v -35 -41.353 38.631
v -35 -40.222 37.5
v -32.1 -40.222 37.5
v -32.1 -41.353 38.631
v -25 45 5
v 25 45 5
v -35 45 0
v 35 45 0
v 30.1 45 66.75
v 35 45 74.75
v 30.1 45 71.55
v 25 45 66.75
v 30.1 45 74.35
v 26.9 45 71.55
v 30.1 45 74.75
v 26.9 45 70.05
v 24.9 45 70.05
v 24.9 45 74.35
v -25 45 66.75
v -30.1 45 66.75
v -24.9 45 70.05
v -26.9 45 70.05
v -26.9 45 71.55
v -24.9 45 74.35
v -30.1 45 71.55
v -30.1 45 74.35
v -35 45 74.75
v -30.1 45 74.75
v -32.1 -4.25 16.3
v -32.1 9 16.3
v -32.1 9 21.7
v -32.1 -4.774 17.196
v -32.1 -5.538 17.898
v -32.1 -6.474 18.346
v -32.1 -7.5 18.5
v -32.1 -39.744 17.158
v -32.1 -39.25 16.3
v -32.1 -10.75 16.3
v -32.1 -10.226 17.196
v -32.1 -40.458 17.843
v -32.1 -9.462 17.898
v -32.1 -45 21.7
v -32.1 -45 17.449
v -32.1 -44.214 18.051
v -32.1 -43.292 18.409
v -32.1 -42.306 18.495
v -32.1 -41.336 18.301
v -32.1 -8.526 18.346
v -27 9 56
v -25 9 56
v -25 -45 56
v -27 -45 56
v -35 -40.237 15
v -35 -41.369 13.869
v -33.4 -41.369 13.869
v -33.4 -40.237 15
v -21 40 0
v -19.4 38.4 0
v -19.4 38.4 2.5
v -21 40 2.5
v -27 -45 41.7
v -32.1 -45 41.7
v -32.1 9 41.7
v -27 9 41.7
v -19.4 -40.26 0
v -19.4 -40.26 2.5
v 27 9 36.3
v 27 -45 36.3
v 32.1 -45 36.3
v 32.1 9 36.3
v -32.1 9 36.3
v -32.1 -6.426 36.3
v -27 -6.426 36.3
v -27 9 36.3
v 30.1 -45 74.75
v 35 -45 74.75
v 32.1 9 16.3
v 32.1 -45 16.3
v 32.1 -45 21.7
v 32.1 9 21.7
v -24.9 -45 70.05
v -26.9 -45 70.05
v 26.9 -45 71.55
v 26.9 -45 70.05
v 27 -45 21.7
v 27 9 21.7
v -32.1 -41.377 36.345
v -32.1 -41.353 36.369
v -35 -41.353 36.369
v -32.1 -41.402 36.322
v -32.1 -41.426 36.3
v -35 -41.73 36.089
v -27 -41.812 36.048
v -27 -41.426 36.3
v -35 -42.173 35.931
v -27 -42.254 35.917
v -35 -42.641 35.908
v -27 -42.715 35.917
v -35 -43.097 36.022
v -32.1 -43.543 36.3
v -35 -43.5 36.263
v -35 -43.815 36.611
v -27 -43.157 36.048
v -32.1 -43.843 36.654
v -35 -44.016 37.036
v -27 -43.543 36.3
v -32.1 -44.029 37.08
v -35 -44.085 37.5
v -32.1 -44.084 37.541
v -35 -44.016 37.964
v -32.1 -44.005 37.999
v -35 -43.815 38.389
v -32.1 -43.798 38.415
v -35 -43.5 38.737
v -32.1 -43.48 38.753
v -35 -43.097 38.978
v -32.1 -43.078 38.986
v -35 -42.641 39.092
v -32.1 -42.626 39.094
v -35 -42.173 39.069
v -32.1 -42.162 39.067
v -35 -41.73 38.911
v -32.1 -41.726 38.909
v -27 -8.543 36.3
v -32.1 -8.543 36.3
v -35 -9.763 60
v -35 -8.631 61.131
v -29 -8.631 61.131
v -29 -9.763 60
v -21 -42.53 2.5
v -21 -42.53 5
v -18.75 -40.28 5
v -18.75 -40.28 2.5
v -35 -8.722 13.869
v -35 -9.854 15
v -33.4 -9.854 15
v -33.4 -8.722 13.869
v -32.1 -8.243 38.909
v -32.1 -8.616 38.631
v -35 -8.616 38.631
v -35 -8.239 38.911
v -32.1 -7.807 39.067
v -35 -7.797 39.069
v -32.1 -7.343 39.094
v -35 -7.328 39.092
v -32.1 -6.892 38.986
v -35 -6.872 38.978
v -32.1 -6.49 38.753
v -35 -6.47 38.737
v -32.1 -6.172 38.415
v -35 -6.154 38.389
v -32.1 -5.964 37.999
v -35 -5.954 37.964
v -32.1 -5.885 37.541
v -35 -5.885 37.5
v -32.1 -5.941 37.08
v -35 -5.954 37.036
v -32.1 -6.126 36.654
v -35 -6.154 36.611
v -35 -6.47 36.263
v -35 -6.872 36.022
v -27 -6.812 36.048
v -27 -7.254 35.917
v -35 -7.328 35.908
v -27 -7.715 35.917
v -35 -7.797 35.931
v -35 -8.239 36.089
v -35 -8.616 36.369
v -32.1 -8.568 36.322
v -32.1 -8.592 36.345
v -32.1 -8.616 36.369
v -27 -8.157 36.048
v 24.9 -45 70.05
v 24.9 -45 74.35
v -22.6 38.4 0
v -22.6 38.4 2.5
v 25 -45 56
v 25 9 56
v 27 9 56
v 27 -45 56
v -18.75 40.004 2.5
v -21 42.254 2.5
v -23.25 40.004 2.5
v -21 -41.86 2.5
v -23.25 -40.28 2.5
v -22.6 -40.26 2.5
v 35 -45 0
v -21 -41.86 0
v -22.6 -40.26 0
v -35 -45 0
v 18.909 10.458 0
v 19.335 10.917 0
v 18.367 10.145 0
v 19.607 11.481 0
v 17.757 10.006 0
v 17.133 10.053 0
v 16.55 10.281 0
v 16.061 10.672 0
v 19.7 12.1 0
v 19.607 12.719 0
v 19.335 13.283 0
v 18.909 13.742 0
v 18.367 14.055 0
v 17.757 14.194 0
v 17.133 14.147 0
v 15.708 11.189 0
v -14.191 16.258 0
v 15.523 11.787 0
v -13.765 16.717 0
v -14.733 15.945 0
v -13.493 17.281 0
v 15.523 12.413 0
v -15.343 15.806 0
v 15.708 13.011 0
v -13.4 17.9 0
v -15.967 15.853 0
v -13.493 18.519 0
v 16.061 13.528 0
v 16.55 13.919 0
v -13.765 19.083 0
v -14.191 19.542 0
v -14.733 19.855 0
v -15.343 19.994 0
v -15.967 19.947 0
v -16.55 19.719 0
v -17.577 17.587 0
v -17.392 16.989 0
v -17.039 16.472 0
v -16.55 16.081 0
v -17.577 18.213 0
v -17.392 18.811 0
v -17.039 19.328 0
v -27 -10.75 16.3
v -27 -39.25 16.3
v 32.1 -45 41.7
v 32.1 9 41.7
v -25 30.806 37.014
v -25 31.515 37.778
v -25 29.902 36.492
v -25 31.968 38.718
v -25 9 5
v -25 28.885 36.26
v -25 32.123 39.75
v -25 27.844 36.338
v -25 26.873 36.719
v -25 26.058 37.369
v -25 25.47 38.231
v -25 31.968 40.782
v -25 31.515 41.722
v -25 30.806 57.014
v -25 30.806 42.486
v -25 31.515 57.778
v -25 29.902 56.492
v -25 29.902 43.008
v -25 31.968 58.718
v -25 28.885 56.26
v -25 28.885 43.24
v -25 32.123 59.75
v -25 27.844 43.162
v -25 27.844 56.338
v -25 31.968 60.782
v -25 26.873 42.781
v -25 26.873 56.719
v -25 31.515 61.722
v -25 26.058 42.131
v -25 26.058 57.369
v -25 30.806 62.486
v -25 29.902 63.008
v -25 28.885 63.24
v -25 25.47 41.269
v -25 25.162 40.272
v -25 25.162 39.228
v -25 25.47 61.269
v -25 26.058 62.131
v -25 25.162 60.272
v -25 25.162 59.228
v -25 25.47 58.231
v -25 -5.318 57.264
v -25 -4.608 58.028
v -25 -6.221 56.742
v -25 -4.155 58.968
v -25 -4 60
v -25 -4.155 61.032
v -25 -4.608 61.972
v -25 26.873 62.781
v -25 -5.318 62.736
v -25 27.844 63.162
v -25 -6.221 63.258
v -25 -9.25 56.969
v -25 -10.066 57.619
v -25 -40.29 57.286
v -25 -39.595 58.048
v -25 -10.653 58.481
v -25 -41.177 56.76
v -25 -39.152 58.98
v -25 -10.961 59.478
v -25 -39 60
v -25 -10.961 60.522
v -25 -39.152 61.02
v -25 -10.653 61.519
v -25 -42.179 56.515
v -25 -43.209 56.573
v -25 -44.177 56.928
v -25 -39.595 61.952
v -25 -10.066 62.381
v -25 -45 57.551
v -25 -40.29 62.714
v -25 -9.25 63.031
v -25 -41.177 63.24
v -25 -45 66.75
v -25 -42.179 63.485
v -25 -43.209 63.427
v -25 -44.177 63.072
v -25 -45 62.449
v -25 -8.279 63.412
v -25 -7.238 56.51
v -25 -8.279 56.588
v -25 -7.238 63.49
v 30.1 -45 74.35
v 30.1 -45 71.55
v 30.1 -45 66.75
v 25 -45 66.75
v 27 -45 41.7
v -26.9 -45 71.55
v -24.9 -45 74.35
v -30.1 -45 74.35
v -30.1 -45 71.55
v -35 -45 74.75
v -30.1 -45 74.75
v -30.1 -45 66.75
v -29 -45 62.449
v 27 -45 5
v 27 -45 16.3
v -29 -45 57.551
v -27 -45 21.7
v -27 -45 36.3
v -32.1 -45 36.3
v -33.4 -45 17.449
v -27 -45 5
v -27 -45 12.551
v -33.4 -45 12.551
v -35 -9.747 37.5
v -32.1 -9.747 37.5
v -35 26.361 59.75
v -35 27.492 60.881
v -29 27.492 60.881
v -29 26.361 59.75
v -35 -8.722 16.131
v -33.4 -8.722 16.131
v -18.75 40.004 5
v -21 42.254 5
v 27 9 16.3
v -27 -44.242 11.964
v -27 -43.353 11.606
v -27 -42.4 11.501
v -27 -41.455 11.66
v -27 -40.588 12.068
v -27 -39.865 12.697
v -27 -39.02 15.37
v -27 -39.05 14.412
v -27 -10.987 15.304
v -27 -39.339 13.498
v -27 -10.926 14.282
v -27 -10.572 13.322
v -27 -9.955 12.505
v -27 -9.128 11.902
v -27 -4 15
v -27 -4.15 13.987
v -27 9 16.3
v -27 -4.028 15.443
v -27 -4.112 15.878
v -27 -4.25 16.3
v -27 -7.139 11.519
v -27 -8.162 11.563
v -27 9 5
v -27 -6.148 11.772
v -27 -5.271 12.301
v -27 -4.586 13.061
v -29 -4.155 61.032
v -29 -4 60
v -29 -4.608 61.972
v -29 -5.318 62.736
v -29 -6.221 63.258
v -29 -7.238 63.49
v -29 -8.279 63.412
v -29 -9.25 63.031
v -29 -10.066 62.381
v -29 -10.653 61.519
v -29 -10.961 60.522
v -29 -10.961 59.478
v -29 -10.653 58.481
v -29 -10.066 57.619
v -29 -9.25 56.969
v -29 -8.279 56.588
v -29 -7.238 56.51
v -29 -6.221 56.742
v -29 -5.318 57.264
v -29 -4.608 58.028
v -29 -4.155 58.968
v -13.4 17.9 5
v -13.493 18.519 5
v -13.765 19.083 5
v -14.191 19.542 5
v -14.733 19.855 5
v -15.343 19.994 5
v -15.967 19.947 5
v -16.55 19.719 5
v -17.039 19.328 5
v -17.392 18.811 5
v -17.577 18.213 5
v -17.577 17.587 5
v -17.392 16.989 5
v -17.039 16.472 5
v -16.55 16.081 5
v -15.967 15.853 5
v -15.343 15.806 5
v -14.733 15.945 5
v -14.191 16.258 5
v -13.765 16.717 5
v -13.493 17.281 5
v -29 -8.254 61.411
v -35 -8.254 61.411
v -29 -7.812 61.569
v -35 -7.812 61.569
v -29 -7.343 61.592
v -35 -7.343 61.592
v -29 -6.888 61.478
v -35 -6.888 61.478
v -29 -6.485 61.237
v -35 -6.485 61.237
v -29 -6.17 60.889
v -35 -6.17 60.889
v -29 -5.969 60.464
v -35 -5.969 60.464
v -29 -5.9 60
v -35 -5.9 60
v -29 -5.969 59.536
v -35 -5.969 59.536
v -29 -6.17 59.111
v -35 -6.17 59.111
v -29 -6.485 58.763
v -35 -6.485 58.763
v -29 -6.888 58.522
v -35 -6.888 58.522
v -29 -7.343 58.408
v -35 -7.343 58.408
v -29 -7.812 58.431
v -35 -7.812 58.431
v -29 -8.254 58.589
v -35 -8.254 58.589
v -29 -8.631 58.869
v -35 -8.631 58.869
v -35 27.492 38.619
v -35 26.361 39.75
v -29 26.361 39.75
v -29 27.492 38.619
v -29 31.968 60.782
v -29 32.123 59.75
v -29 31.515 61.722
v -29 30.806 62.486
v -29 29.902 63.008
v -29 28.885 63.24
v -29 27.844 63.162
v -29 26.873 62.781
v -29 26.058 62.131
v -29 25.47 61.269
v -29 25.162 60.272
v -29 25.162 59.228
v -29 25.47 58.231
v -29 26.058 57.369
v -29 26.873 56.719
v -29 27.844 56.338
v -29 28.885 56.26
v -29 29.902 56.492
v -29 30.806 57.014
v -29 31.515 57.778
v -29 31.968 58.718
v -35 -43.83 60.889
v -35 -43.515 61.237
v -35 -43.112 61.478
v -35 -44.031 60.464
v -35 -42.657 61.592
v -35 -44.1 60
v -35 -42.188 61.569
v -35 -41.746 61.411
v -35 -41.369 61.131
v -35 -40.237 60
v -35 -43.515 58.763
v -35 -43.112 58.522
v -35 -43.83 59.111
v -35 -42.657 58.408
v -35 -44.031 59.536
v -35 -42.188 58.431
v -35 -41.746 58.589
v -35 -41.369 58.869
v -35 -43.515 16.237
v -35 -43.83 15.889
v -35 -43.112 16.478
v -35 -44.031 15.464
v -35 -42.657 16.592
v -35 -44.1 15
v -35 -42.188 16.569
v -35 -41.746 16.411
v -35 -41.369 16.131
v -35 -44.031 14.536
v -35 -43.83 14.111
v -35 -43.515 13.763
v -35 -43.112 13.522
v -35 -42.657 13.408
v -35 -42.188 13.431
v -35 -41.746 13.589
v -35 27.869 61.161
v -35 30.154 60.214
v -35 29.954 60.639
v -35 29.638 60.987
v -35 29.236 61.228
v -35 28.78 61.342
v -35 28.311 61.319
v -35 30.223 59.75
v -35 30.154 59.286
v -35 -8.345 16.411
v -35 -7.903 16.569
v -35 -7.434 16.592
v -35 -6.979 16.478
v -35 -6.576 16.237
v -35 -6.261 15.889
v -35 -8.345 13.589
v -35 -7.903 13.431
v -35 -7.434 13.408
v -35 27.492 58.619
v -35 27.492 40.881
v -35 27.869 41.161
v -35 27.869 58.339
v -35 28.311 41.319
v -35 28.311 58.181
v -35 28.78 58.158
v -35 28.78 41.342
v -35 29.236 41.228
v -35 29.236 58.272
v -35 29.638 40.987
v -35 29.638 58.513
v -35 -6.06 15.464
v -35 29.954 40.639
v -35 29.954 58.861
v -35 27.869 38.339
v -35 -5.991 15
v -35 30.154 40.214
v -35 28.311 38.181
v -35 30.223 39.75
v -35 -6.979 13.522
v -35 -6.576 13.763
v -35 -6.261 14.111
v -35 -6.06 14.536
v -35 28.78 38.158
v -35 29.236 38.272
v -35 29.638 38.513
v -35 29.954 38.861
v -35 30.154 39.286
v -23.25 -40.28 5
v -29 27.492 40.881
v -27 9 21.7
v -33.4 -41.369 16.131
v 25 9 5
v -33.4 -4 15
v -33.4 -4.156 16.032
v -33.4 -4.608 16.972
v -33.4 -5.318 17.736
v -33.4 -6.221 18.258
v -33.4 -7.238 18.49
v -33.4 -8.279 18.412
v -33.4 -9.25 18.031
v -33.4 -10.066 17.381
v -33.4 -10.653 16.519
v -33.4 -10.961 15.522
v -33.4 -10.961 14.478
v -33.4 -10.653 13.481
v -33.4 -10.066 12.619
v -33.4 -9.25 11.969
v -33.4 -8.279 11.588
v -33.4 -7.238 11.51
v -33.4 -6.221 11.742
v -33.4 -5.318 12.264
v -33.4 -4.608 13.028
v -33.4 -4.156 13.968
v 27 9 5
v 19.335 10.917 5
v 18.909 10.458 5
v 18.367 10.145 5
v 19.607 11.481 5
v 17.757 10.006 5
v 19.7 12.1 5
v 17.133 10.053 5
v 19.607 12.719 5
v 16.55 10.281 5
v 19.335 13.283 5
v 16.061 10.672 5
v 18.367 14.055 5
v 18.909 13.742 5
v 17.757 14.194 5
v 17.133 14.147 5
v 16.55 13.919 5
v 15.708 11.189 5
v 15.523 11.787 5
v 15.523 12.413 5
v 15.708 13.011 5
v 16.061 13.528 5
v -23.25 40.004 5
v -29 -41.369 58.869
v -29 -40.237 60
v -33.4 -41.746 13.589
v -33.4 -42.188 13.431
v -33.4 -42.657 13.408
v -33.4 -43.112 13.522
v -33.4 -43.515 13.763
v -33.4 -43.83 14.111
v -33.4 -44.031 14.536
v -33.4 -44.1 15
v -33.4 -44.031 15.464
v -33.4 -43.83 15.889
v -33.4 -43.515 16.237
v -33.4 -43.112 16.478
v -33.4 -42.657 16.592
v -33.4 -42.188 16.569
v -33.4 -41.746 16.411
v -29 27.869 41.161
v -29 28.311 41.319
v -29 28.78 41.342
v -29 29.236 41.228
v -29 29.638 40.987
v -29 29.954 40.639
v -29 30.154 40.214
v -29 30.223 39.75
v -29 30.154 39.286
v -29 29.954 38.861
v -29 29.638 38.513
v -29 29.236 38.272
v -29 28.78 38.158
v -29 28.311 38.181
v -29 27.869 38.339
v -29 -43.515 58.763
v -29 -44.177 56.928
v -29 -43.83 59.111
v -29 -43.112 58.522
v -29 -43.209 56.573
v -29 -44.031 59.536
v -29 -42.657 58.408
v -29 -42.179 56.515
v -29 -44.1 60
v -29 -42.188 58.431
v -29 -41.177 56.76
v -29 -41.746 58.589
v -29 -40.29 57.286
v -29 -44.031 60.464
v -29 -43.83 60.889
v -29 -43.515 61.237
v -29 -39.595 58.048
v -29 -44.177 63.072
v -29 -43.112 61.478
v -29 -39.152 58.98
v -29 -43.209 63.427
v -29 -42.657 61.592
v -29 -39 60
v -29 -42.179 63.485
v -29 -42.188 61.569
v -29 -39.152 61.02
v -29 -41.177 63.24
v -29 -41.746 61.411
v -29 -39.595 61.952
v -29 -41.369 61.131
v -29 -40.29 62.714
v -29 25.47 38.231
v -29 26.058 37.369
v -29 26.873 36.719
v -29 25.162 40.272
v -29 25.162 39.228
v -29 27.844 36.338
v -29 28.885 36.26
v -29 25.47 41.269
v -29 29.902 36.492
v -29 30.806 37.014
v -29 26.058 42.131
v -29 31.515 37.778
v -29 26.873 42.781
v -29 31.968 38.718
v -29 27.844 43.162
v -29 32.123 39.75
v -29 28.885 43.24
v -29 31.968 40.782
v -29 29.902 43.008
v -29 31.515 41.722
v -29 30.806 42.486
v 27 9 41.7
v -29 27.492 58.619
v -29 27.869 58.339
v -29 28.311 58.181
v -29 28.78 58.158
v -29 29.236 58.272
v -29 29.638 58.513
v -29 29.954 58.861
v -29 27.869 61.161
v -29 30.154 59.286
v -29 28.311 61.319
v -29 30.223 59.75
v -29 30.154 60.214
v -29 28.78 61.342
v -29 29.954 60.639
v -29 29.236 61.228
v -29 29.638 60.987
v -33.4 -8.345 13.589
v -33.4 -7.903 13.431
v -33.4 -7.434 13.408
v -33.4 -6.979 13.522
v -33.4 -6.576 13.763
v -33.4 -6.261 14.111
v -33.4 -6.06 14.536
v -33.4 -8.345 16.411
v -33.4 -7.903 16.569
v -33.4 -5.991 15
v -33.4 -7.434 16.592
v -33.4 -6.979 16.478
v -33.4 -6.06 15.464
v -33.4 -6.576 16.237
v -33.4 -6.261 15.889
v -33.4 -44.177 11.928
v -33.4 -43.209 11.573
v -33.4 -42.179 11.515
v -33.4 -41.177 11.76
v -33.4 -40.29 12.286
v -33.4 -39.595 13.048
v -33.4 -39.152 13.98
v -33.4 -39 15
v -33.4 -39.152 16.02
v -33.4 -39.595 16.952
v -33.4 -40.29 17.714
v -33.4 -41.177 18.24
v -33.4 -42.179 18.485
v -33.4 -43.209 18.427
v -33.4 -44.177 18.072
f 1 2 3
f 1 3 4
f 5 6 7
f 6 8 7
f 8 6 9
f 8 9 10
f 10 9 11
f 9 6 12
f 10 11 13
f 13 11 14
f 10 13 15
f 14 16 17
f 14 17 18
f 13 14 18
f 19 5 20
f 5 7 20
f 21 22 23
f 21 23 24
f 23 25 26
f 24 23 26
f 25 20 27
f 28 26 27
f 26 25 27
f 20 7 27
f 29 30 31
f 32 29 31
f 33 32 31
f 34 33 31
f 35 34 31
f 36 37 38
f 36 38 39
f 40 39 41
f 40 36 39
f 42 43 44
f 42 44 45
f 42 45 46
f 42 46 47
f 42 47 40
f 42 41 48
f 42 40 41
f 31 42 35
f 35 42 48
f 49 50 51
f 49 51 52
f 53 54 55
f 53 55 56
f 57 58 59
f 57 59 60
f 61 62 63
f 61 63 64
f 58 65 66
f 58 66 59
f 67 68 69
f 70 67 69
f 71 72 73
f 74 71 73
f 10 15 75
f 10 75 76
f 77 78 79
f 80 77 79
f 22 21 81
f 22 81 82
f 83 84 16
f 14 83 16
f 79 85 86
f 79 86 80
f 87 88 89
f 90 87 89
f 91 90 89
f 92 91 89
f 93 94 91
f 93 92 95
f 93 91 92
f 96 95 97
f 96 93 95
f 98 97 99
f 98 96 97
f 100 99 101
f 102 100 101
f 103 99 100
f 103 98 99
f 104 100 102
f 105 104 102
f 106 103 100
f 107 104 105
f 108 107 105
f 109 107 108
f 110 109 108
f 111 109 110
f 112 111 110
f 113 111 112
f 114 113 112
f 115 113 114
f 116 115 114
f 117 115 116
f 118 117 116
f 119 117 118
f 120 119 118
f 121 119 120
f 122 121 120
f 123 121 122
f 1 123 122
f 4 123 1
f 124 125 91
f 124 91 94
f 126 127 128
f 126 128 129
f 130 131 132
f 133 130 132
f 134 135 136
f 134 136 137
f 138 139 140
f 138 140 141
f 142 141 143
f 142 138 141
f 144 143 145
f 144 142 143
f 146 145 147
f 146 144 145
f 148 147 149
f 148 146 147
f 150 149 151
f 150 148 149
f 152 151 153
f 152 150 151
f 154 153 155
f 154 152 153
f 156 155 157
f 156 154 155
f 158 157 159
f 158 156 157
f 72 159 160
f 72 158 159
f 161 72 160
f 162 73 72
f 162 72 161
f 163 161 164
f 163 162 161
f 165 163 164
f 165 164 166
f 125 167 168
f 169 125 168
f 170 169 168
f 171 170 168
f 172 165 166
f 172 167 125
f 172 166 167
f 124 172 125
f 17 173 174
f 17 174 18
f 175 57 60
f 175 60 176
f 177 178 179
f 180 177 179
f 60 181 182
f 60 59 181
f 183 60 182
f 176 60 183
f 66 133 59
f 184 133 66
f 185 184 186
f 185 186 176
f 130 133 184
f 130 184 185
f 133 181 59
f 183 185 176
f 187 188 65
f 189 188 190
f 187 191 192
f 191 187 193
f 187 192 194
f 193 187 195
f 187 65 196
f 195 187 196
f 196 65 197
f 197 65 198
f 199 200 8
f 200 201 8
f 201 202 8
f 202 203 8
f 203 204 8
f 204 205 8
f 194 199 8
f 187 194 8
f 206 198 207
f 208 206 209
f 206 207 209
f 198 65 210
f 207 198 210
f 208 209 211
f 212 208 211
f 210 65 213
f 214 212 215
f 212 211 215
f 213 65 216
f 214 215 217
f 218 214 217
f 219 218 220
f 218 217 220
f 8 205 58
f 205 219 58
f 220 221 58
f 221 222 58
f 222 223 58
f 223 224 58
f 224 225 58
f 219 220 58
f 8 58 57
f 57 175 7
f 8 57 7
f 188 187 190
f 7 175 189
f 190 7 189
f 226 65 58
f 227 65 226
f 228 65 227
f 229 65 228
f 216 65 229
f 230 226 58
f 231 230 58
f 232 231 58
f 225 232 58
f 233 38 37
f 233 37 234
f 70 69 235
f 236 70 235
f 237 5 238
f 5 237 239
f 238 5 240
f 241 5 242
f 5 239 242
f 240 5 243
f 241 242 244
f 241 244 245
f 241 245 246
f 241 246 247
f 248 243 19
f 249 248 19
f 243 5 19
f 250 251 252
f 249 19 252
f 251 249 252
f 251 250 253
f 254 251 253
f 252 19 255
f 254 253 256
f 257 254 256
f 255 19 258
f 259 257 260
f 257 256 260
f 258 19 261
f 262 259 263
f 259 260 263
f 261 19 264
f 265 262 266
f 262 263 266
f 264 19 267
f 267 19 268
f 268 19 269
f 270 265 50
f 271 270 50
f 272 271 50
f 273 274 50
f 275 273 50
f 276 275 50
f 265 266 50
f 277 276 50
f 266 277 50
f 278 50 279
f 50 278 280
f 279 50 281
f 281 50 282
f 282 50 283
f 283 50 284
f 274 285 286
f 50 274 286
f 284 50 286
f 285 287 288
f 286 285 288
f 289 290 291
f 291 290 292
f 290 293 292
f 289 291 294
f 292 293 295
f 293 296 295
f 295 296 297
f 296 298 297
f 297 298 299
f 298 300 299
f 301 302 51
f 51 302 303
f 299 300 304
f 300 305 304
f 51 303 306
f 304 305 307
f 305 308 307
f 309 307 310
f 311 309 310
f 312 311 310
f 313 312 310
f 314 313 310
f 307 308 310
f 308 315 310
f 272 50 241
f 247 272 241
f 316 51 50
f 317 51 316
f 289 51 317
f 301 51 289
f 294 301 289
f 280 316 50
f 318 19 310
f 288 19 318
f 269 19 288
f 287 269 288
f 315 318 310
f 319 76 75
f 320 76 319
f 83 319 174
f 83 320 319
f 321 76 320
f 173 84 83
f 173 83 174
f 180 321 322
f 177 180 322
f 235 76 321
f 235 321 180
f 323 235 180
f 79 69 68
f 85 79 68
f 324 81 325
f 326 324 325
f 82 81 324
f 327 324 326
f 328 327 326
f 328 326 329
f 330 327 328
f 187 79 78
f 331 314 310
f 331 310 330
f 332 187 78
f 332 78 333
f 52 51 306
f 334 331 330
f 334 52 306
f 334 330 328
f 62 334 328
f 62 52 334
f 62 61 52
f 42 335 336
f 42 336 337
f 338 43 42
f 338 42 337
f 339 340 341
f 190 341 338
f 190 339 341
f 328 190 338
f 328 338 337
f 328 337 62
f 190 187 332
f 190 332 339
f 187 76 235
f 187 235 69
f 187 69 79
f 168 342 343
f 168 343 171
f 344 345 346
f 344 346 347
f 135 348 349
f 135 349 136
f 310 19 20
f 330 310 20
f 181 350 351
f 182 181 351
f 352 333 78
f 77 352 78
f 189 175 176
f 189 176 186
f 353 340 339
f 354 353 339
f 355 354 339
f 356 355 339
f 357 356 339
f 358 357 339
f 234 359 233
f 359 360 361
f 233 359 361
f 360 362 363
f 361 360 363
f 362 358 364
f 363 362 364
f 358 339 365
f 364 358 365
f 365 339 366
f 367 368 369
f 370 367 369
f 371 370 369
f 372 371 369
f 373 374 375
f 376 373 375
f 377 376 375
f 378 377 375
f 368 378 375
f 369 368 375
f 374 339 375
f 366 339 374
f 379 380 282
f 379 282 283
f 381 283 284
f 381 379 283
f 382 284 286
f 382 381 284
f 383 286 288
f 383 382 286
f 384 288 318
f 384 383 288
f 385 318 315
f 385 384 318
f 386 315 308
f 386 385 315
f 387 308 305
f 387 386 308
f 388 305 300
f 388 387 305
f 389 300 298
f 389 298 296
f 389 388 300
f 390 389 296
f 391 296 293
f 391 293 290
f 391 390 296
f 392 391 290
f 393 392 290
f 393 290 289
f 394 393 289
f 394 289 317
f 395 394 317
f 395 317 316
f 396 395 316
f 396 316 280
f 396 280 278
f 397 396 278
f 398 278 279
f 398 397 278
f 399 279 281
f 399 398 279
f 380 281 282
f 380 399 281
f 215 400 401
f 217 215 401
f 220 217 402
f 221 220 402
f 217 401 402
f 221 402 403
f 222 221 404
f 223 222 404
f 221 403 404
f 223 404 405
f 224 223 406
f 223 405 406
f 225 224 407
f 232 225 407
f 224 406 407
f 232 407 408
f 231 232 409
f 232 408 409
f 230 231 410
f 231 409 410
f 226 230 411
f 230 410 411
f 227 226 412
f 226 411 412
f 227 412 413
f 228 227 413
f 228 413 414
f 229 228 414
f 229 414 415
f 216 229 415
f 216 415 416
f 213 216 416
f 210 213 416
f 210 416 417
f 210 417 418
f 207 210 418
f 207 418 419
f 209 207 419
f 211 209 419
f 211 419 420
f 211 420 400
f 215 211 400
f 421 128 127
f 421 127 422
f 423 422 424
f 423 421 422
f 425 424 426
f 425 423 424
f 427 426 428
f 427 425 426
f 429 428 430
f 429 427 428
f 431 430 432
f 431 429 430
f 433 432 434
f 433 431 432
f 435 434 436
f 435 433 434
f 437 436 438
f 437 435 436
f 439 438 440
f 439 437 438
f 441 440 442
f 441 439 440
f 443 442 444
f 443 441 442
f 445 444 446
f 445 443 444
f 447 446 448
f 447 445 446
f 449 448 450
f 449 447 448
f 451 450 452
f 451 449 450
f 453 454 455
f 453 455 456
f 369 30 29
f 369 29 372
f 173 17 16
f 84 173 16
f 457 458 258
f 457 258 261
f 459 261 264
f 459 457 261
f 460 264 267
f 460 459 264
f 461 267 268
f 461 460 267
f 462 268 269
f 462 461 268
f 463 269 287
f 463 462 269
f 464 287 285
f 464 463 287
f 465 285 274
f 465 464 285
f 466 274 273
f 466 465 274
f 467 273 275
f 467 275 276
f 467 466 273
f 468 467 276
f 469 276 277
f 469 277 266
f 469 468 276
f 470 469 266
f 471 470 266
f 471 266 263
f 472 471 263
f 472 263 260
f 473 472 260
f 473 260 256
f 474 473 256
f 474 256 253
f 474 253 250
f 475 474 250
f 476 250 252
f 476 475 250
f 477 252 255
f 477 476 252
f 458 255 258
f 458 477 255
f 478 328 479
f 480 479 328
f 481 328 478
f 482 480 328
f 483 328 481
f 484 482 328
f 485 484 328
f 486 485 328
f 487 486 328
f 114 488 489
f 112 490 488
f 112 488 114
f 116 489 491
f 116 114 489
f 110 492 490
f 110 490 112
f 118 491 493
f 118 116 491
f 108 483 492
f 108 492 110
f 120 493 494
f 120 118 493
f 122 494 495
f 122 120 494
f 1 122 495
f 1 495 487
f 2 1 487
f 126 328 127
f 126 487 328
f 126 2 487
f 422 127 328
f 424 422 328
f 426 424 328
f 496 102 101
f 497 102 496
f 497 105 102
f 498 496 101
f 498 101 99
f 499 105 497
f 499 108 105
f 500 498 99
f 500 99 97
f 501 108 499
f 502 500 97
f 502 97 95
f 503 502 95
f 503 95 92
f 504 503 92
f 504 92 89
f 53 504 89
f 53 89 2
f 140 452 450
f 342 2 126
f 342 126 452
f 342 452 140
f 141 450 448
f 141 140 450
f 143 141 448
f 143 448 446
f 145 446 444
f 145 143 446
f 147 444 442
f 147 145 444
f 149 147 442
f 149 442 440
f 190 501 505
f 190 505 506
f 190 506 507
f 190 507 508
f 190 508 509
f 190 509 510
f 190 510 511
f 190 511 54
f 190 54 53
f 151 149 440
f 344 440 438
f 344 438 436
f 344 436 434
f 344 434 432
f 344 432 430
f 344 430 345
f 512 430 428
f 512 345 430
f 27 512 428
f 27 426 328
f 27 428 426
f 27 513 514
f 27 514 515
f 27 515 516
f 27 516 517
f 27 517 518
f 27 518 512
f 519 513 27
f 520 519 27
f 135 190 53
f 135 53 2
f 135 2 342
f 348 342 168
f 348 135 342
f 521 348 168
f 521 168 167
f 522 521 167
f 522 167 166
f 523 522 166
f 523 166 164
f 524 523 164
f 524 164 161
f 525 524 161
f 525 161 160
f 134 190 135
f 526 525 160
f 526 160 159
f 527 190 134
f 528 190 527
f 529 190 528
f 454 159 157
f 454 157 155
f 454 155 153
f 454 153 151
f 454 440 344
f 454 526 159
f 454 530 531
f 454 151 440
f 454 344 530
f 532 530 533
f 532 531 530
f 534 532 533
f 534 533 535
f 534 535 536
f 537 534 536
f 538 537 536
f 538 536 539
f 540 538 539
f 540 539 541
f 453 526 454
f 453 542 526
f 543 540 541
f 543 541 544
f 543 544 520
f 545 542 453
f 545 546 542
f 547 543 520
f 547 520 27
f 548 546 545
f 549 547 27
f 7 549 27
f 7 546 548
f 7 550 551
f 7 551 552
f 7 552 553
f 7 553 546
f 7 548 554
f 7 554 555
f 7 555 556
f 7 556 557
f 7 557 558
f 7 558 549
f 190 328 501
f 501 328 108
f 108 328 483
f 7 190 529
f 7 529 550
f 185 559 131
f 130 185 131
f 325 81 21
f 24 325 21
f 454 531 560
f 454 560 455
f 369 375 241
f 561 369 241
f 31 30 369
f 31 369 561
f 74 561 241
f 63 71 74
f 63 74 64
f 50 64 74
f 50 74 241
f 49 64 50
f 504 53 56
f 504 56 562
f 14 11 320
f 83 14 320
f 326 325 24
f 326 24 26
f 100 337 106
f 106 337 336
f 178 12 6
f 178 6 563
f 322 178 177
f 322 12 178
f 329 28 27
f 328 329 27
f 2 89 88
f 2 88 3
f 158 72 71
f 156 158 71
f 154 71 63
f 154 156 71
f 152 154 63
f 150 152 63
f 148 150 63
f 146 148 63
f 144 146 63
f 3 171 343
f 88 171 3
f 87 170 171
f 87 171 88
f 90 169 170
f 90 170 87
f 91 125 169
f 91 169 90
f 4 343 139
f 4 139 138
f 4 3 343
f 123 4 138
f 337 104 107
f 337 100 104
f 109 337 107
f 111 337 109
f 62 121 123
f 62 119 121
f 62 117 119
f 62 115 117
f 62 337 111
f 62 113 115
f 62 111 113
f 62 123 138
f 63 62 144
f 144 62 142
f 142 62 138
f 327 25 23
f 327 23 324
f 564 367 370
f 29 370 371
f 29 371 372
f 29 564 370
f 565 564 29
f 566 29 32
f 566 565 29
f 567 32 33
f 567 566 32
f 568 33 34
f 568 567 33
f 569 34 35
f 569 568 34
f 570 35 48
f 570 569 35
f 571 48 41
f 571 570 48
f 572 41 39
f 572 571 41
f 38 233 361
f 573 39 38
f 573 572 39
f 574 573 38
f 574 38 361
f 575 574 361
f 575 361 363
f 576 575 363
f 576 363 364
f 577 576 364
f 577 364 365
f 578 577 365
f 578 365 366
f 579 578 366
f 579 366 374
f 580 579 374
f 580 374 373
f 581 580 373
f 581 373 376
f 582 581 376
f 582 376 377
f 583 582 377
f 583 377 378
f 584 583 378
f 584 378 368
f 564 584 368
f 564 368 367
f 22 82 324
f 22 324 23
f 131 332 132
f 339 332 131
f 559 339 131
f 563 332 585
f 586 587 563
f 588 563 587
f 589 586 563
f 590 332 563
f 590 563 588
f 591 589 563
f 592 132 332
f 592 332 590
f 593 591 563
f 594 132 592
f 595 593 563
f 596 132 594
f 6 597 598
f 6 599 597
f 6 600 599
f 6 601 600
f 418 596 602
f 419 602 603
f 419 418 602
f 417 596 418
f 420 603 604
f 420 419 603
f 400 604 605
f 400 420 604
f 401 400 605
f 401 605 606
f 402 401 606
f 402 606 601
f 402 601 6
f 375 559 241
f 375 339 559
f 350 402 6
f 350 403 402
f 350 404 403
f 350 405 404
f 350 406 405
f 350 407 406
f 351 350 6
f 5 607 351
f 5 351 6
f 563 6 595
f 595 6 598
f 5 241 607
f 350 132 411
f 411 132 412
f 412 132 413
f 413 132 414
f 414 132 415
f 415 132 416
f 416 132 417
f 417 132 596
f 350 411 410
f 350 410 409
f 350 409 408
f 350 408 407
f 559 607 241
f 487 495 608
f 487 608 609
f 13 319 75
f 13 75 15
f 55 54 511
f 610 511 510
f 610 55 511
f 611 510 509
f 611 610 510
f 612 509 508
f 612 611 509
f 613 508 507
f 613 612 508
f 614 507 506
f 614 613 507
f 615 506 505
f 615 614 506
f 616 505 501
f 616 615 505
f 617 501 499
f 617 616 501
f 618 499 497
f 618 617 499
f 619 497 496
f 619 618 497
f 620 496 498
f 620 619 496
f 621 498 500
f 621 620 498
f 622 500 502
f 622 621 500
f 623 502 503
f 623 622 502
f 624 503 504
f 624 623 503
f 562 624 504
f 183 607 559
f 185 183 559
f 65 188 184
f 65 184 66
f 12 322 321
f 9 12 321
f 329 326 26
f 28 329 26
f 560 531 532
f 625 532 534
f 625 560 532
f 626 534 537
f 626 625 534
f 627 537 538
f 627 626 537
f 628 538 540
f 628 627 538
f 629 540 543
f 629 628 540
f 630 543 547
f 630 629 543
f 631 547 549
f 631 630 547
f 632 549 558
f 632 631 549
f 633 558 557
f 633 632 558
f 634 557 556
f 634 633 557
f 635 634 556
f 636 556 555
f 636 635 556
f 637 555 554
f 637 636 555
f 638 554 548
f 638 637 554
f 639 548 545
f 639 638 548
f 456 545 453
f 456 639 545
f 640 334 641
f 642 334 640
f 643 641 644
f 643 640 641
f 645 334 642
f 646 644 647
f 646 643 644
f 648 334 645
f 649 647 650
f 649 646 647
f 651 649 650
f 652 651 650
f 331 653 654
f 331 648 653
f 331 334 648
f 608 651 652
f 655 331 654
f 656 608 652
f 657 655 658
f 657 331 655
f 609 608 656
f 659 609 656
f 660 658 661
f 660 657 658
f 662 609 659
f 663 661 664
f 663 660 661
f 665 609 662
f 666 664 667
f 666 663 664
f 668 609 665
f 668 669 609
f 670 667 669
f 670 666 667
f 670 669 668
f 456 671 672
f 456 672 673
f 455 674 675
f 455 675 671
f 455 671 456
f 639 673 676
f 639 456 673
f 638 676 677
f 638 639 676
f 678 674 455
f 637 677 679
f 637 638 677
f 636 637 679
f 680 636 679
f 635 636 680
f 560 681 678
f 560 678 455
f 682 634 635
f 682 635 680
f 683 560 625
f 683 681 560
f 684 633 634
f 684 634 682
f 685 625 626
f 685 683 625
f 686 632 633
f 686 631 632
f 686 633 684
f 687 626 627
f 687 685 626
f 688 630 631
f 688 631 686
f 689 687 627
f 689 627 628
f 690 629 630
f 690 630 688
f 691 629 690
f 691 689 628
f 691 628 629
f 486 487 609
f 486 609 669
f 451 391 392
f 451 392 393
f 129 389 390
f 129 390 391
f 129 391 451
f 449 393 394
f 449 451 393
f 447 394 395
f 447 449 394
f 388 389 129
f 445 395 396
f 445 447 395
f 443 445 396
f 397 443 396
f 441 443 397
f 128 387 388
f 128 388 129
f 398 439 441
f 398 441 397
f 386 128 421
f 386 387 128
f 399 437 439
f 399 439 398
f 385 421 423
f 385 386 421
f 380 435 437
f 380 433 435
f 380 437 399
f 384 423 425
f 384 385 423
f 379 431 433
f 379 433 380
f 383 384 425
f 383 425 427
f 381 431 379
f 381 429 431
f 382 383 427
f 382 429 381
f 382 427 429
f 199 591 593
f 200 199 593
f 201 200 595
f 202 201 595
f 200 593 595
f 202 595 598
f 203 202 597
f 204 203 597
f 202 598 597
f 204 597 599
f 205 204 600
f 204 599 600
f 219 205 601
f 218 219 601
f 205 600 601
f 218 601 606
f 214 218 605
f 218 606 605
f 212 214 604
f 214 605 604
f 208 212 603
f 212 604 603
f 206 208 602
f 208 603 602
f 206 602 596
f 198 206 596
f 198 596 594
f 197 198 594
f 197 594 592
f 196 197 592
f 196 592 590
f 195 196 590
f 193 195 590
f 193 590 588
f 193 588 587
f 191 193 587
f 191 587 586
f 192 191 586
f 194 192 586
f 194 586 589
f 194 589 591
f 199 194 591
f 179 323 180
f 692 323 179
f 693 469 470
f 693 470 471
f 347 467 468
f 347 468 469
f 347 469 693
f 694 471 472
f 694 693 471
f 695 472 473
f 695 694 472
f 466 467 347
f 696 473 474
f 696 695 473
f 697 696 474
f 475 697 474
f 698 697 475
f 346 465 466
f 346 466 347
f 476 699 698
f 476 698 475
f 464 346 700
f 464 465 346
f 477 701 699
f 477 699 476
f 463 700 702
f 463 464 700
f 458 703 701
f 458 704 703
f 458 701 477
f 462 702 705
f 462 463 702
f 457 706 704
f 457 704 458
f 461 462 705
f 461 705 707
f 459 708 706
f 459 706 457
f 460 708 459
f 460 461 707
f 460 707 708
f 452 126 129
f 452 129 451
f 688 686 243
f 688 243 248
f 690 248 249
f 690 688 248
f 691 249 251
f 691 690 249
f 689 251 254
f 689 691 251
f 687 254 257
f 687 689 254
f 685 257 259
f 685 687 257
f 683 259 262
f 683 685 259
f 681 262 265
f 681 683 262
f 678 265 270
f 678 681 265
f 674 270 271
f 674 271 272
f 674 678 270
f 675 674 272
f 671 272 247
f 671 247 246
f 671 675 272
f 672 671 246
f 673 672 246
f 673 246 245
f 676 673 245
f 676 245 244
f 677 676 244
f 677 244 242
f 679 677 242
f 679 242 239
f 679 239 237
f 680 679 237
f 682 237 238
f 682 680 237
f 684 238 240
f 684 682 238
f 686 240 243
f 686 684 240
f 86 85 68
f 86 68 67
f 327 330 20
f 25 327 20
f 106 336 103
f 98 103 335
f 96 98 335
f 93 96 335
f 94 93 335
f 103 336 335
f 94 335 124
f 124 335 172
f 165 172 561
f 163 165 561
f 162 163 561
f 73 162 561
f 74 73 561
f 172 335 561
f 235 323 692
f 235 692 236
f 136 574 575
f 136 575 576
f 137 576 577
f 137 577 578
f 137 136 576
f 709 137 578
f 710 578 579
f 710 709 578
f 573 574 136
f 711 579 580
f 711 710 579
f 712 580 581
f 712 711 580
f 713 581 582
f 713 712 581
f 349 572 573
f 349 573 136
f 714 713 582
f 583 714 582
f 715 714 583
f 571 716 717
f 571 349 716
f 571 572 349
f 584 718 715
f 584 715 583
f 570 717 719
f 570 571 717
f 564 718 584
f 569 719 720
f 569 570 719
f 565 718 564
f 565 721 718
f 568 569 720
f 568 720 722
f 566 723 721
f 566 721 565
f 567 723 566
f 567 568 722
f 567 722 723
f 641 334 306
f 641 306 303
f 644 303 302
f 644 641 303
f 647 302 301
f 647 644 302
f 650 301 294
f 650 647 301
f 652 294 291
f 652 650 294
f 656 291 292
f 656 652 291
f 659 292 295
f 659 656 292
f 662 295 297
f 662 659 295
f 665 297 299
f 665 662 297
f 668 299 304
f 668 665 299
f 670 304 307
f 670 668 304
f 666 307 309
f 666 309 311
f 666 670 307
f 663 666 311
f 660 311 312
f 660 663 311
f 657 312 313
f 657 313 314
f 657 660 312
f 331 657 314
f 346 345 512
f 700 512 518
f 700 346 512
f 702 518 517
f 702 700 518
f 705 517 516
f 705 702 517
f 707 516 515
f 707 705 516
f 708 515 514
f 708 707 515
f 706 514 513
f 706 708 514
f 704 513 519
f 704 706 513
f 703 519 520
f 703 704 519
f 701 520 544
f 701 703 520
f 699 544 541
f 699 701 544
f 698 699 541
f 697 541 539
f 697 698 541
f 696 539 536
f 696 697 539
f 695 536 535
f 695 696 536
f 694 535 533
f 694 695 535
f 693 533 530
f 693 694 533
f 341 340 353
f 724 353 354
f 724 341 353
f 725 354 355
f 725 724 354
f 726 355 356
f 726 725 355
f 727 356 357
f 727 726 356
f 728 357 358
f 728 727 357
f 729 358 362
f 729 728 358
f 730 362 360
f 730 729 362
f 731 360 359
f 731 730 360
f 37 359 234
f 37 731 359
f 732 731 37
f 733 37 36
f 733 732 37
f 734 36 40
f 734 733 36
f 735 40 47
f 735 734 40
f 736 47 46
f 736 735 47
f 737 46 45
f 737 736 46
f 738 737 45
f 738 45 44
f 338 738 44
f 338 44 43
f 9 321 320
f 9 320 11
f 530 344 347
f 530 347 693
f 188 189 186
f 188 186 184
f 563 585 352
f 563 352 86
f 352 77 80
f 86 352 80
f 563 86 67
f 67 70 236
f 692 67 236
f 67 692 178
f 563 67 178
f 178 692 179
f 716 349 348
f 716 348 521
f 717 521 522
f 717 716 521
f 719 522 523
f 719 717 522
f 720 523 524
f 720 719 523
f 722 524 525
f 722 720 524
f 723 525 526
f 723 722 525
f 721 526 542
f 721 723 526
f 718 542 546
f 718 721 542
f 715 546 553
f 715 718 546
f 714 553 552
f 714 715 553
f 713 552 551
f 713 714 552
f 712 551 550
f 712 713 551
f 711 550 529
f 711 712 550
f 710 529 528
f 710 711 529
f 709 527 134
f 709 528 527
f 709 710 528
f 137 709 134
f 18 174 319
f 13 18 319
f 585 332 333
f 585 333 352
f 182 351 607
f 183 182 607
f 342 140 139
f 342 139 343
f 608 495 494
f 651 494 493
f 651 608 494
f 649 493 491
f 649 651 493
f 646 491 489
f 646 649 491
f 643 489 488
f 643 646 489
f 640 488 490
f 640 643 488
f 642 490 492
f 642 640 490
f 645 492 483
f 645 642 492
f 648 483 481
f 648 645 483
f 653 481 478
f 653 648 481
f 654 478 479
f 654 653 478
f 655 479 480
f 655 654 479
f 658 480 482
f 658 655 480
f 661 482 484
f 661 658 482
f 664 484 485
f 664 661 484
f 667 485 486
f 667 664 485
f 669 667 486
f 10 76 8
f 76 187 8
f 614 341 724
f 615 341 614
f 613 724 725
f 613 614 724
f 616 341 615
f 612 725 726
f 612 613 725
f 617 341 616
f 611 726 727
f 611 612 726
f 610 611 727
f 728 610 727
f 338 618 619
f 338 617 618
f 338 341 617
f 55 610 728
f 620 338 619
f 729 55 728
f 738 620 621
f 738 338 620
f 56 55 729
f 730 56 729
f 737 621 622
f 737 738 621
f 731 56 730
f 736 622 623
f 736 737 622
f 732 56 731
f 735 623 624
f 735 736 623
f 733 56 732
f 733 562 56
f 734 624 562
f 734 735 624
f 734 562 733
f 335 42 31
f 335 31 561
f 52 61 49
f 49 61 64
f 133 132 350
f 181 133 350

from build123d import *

# Parameters (mm, degrees)
SKETCH1_W                 = 90
SKETCH1_H                 = 70
BOSS_EXTRUDE1_DEPTH       = 5
SKETCH2_W                 = 8
SKETCH2_H                 = 90
BOSS_EXTRUDE2_DEPTH       = 51
SKETCH3_W                 = 5.1
SKETCH3_H                 = 5.4
CUT_EXTRUDE1_DEPTH        = 54
SKETCH14_W                = 10
SKETCH14_H                = 90
BOSS_EXTRUDE6_DEPTH       = 11.75
SKETCH15_W                = 4.9
SKETCH15_H                = 90
BOSS_EXTRUDE7_DEPTH       = 7
SKETCH17_W                = 90
SKETCH17_H                = 2.8
BOSS_EXTRUDE8_DEPTH       = 5
SKETCH16_W                = 5.1
SKETCH16_H                = 90
CUT_EXTRUDE3_DEPTH        = 1
BOSS_EXTRUDE9_START       = -1.5
SKETCH18_W                = 2
SKETCH18_H                = 90
BOSS_EXTRUDE9_DEPTH       = 4.3
SKETCH43_W                = 36
SKETCH43_H                = 51
BOSS_EXTRUDE10_DEPTH      = 2
CUT_EXTRUDE4_START        = -10
SKETCH44_R                = 1.6
CUT_EXTRUDE4_DEPTH        = 10
SKETCH45_R                = 1.6
CUT_EXTRUDE5_DEPTH        = 95.008310803
CUT_EXTRUDE6_DEPTH        = 2.5
CUT_EXTRUDE7_DEPTH        = 2.5
ADVANCEDHOLE4_START       = -33.4
ADVANCEDHOLE4_OUTLINE_R   = 1.6
ADVANCEDHOLE4_OUTLINE_R_2 = 3.5
ADVANCEDHOLE4_DEPTH       = 6.4
ADVANCEDHOLE5_START       = -29
ADVANCEDHOLE5_OUTLINE_R   = 1.6
ADVANCEDHOLE5_OUTLINE_R_2 = 3.5
ADVANCEDHOLE5_DEPTH       = 4
CUT_EXTRUDE8_REACH        = 113.86
SKETCH65_R                = 2.1
CUT_EXTRUDE9_DEPTH        = 10


# Read off the part's stored shape, not the designer's step: AdvancedHole4, AdvancedHole5
with BuildPart() as part:
    # Sketch1 → Boss-Extrude1 (new body)
    with BuildSketch(Plane(origin=(0, 0, 0), x_dir=(0, 1, 0), z_dir=(0, 0, 1))):
        Rectangle(SKETCH1_W, SKETCH1_H)
    extrude(amount=BOSS_EXTRUDE1_DEPTH)

    # Sketch2 → Boss-Extrude2 (add)
    with BuildSketch(Plane.XY.offset(5)):
        with Locations((-31, 0)):
            Rectangle(SKETCH2_W, SKETCH2_H)
        with Locations((31, 0)):
            Rectangle(SKETCH2_W, SKETCH2_H)
    extrude(amount=BOSS_EXTRUDE2_DEPTH)

    # Sketch3 → Cut-Extrude1 (cut)
    with BuildSketch(Plane.XZ.offset(45)):
        with Locations((-29.55, 19)):
            Rectangle(SKETCH3_W, SKETCH3_H)
        with Locations((-29.55, 39)):
            Rectangle(SKETCH3_W, SKETCH3_H)
        with Locations((29.55, 19)):
            Rectangle(SKETCH3_W, SKETCH3_H)
        with Locations((29.55, 39)):
            Rectangle(SKETCH3_W, SKETCH3_H)
    extrude(amount=-CUT_EXTRUDE1_DEPTH, mode=Mode.SUBTRACT)

    # Sketch14 → Boss-Extrude6 (add)
    with BuildSketch(Plane.XY.offset(56)):
        with Locations((30, 0)):
            Rectangle(SKETCH14_W, SKETCH14_H)
    boss_extrude6 = extrude(amount=BOSS_EXTRUDE6_DEPTH)

    # Sketch15 → Boss-Extrude7 (add)
    with BuildSketch(Plane.XY.offset(67.75)):
        with Locations((32.55, 0)):
            Rectangle(SKETCH15_W, SKETCH15_H)
    boss_extrude7 = extrude(amount=BOSS_EXTRUDE7_DEPTH)

    # Sketch17 → Boss-Extrude8 (add)
    with BuildSketch(Plane(origin=(30.1, 0, 0), x_dir=(0, -1, 0), z_dir=(-1, 0, 0))):
        with Locations((0, 72.95)):
            Rectangle(SKETCH17_W, SKETCH17_H)
    boss_extrude8 = extrude(amount=BOSS_EXTRUDE8_DEPTH)

    # Sketch16 → Cut-Extrude3 (cut)
    with BuildSketch(Plane.XY.offset(67.75)):
        with Locations((27.55, 0)):
            Rectangle(SKETCH16_W, SKETCH16_H)
    cut_extrude3 = extrude(amount=-CUT_EXTRUDE3_DEPTH, mode=Mode.SUBTRACT)

    # Sketch18 → Boss-Extrude9 (add)
    with BuildSketch(Plane.XY.offset(71.55).offset(BOSS_EXTRUDE9_START)):
        with Locations((25.9, 0)):
            Rectangle(SKETCH18_W, SKETCH18_H)
    boss_extrude9 = extrude(amount=BOSS_EXTRUDE9_DEPTH)

    # Sketch43 → Boss-Extrude10 (add)
    with BuildSketch(Plane(origin=(27, 0, 0), x_dir=(0, -1, 0), z_dir=(-1, 0, 0))):
        with Locations((-27, 30.5)):
            Rectangle(SKETCH43_W, SKETCH43_H)
    boss_extrude10 = extrude(amount=BOSS_EXTRUDE10_DEPTH)

    # Mirror2: Boss-Extrude6, Boss-Extrude7, Boss-Extrude8, Cut-Extrude3, Boss-Extrude9, Boss-Extrude10 across plane
    add(boss_extrude6.mirror(Plane(origin=(0, 0, 0), x_dir=(0, 0, 1), z_dir=(1, 0, 0))))
    add(boss_extrude7.mirror(Plane(origin=(0, 0, 0), x_dir=(0, 0, 1), z_dir=(1, 0, 0))))
    add(boss_extrude8.mirror(Plane(origin=(0, 0, 0), x_dir=(0, 0, 1), z_dir=(1, 0, 0))))
    add(cut_extrude3.mirror(Plane(origin=(0, 0, 0), x_dir=(0, 0, 1), z_dir=(1, 0, 0))), mode=Mode.SUBTRACT)
    add(boss_extrude9.mirror(Plane(origin=(0, 0, 0), x_dir=(0, 0, 1), z_dir=(1, 0, 0))))
    add(boss_extrude10.mirror(Plane(origin=(0, 0, 0), x_dir=(0, 0, 1), z_dir=(1, 0, 0))))

    # Sketch44 → Cut-Extrude4 (cut)
    with BuildSketch(Plane(origin=(-35, 0, 0), x_dir=(0, -1, 0), z_dir=(-1, 0, 0)).offset(CUT_EXTRUDE4_START)):
        with Locations(Location((42.5, 15, 0), (0, 0, 90))):
            Circle(SKETCH44_R)
        with Locations(Location((42.484661232, 37.5, 0), (0, 0, 90))):
            Circle(SKETCH44_R)
        with Locations(Location((42.5, 60, 0), (0, 0, 90))):
            Circle(SKETCH44_R)
        with Locations(Location((7.5, 60, 0), (0, 0, 90))):
            Circle(SKETCH44_R)
        with Locations(Location((7.484661232, 37.5, 0), (0, 0, 90))):
            Circle(SKETCH44_R)
        with Locations(Location((-28.623308021, 39.75, 0), (0, 0, 90))):
            Circle(SKETCH44_R)
        with Locations(Location((-28.623308021, 59.75, 0), (0, 0, 90))):
            Circle(SKETCH44_R)
        with Locations(Location((7.590893279, 15, 0), (0, 0, 90))):
            Circle(SKETCH44_R)
    extrude(amount=CUT_EXTRUDE4_DEPTH, mode=Mode.SUBTRACT)

    # Sketch45 → Cut-Extrude5 (cut, through all)
    with BuildSketch(Plane(origin=(0, 0, 0), x_dir=(1, 0, 0), z_dir=(0, 0, -1))):
        with Locations(Location((-21, 17.516567366, 0), (0, 0, 180))):
            Circle(SKETCH45_R)
    extrude(amount=-CUT_EXTRUDE5_DEPTH, mode=Mode.SUBTRACT)

    # Sketch46 → Cut-Extrude6 (cut)
    with BuildSketch(Plane(origin=(0, 0, 5), x_dir=(1, 0, 0), z_dir=(0, 0, -1))):
        Polygon((-18.75, 40.280204311), (-18.75, -40.004074809), (-21, -42.254074809), (-23.25, -40.004074809), (-23.25, 40.280204311), (-21, 42.530204311), align=None)
    extrude(amount=CUT_EXTRUDE6_DEPTH, mode=Mode.SUBTRACT)

    # Sketch49 → Cut-Extrude7 (cut)
    with BuildSketch(Plane(origin=(0, 0, 0), x_dir=(1, 0, 0), z_dir=(0, 0, -1))):
        Polygon((-19.4, 40.26), (-19.4, -38.4), (-21, -40), (-22.6, -38.4), (-22.6, 40.26), (-21, 41.86), align=None)
    extrude(amount=-CUT_EXTRUDE7_DEPTH, mode=Mode.SUBTRACT)

    # AdvancedHole4 outline → AdvancedHole4 (cut)
    # profile 1 of 2: a face of its own
    with BuildSketch(Plane.YZ.offset(ADVANCEDHOLE4_START)):
        with BuildLine():
            Line((-45, 16.3), (-45, 12.550510257))
            ThreePointArc((-45, 12.550510257), (-39, 15), (-45, 17.449489743))
            Line((-45, 17.449489743), (-45, 16.3))
        make_face()
        with Locations((-42.5, 15)):
            Circle(ADVANCEDHOLE4_OUTLINE_R, mode=Mode.SUBTRACT)
    # profile 2 of 2: a face of its own
    with BuildSketch(Plane.YZ.offset(ADVANCEDHOLE4_START)):
        with Locations((-7.500016499, 15)):
            Circle(ADVANCEDHOLE4_OUTLINE_R_2)
        with Locations((-7.590893279, 15)):
            Circle(ADVANCEDHOLE4_OUTLINE_R, mode=Mode.SUBTRACT)
    extrude(amount=ADVANCEDHOLE4_DEPTH, mode=Mode.SUBTRACT)

    # AdvancedHole5 outline → AdvancedHole5 (cut)
    # profile 1 of 4: a face of its own
    with BuildSketch(Plane.YZ.offset(ADVANCEDHOLE5_START)):
        with BuildLine():
            Line((-45, 62.449489743), (-45, 57.550510257))
            ThreePointArc((-45, 57.550510257), (-39, 60), (-45, 62.449489743))
        make_face()
        with Locations((-42.5, 60)):
            Circle(ADVANCEDHOLE5_OUTLINE_R, mode=Mode.SUBTRACT)
    # profile 2 of 4: a face of its own
    with BuildSketch(Plane.YZ.offset(ADVANCEDHOLE5_START)):
        with Locations((28.623308021, 39.75)):
            Circle(ADVANCEDHOLE5_OUTLINE_R_2)
        with Locations((28.623308021, 39.75)):
            Circle(ADVANCEDHOLE5_OUTLINE_R, mode=Mode.SUBTRACT)
    # profile 3 of 4: a face of its own
    with BuildSketch(Plane.YZ.offset(ADVANCEDHOLE5_START)):
        with Locations((-7.5, 60)):
            Circle(ADVANCEDHOLE5_OUTLINE_R_2)
        with Locations((-7.5, 60)):
            Circle(ADVANCEDHOLE5_OUTLINE_R, mode=Mode.SUBTRACT)
    # profile 4 of 4: a face of its own
    with BuildSketch(Plane.YZ.offset(ADVANCEDHOLE5_START)):
        with Locations((28.623308021, 59.75)):
            Circle(ADVANCEDHOLE5_OUTLINE_R_2)
        with Locations((28.623308021, 59.75)):
            Circle(ADVANCEDHOLE5_OUTLINE_R, mode=Mode.SUBTRACT)
    extrude(amount=ADVANCEDHOLE5_DEPTH, mode=Mode.SUBTRACT)

    # Sketch64 → Cut-Extrude8 (cut, up to next)
    with BuildSketch(Plane(origin=(-35, 0, 0), x_dir=(0, -1, 0), z_dir=(-1, 0, 0)), mode=Mode.PRIVATE) as cut_extrude8_sk1:
        with BuildLine():
            Line((-27.491937171, 60.88137085), (-26.360566322, 59.75))
            Line((-26.360566322, 59.75), (-27.491937171, 58.61862915))
            ThreePointArc((-27.491937171, 58.61862915), (-30.223308021, 59.75), (-27.491937171, 60.88137085))
        make_face()
    cut_extrude8_tool1 = extrude(cut_extrude8_sk1.sketch, amount=-CUT_EXTRUDE8_REACH, mode=Mode.PRIVATE) & part.part
    # Sketch64 → Cut-Extrude8 (cut, up to next)
    with BuildSketch(Plane(origin=(-35, 0, 0), x_dir=(0, -1, 0), z_dir=(-1, 0, 0)), mode=Mode.PRIVATE) as cut_extrude8_sk2:
        with BuildLine():
            Line((-27.491937171, 40.88137085), (-26.360566322, 39.75))
            Line((-26.360566322, 39.75), (-27.491937171, 38.61862915))
            ThreePointArc((-27.491937171, 38.61862915), (-30.223308021, 39.75), (-27.491937171, 40.88137085))
        make_face()
    cut_extrude8_tool2 = extrude(cut_extrude8_sk2.sketch, amount=-CUT_EXTRUDE8_REACH, mode=Mode.PRIVATE) & part.part
    # Sketch64 → Cut-Extrude8 (cut, up to next)
    with BuildSketch(Plane(origin=(-35, 0, 0), x_dir=(0, -1, 0), z_dir=(-1, 0, 0)), mode=Mode.PRIVATE) as cut_extrude8_sk3:
        with BuildLine():
            Line((8.722264129, 16.13137085), (9.853634979, 15))
            Line((9.853634979, 15), (8.722264129, 13.86862915))
            ThreePointArc((8.722264129, 13.86862915), (5.990893279, 15), (8.722264129, 16.13137085))
        make_face()
    cut_extrude8_tool3 = extrude(cut_extrude8_sk3.sketch, amount=-CUT_EXTRUDE8_REACH, mode=Mode.PRIVATE) & part.part
    # Sketch64 → Cut-Extrude8 (cut, up to next)
    with BuildSketch(Plane(origin=(-35, 0, 0), x_dir=(0, -1, 0), z_dir=(-1, 0, 0)), mode=Mode.PRIVATE) as cut_extrude8_sk4:
        with BuildLine():
            Line((8.616032082, 38.63137085), (9.747402932, 37.5))
            Line((9.747402932, 37.5), (8.616032082, 36.36862915))
            ThreePointArc((8.616032082, 36.36862915), (5.884661232, 37.5), (8.616032082, 38.63137085))
        make_face()
    cut_extrude8_tool4 = extrude(cut_extrude8_sk4.sketch, amount=-CUT_EXTRUDE8_REACH, mode=Mode.PRIVATE) & part.part
    # Sketch64 → Cut-Extrude8 (cut, up to next)
    with BuildSketch(Plane(origin=(-35, 0, 0), x_dir=(0, -1, 0), z_dir=(-1, 0, 0)), mode=Mode.PRIVATE) as cut_extrude8_sk5:
        with BuildLine():
            Line((8.63137085, 61.13137085), (9.7627417, 60))
            Line((9.7627417, 60), (8.63137085, 58.86862915))
            ThreePointArc((8.63137085, 58.86862915), (5.9, 60), (8.63137085, 61.13137085))
        make_face()
    cut_extrude8_tool5 = extrude(cut_extrude8_sk5.sketch, amount=-CUT_EXTRUDE8_REACH, mode=Mode.PRIVATE) & part.part
    # Sketch64 → Cut-Extrude8 (cut, up to next)
    with BuildSketch(Plane(origin=(-35, 0, 0), x_dir=(0, -1, 0), z_dir=(-1, 0, 0)), mode=Mode.PRIVATE) as cut_extrude8_sk6:
        with BuildLine():
            Line((41.36862915, 58.86862915), (40.2372583, 60))
            Line((40.2372583, 60), (41.36862915, 61.13137085))
            ThreePointArc((41.36862915, 61.13137085), (44.1, 60), (41.36862915, 58.86862915))
        make_face()
    cut_extrude8_tool6 = extrude(cut_extrude8_sk6.sketch, amount=-CUT_EXTRUDE8_REACH, mode=Mode.PRIVATE) & part.part
    # Sketch64 → Cut-Extrude8 (cut, up to next)
    with BuildSketch(Plane(origin=(-35, 0, 0), x_dir=(0, -1, 0), z_dir=(-1, 0, 0)), mode=Mode.PRIVATE) as cut_extrude8_sk7:
        with BuildLine():
            Line((41.353290382, 36.36862915), (40.221919532, 37.5))
            Line((40.221919532, 37.5), (41.353290382, 38.63137085))
            ThreePointArc((41.353290382, 38.63137085), (44.084661232, 37.5), (41.353290382, 36.36862915))
        make_face()
    cut_extrude8_tool7 = extrude(cut_extrude8_sk7.sketch, amount=-CUT_EXTRUDE8_REACH, mode=Mode.PRIVATE) & part.part
    # Sketch64 → Cut-Extrude8 (cut, up to next)
    with BuildSketch(Plane(origin=(-35, 0, 0), x_dir=(0, -1, 0), z_dir=(-1, 0, 0)), mode=Mode.PRIVATE) as cut_extrude8_sk8:
        with BuildLine():
            Line((41.36862915, 13.86862915), (40.2372583, 15))
            Line((40.2372583, 15), (41.36862915, 16.13137085))
            ThreePointArc((41.36862915, 16.13137085), (44.1, 15), (41.36862915, 13.86862915))
        make_face()
    cut_extrude8_tool8 = extrude(cut_extrude8_sk8.sketch, amount=-CUT_EXTRUDE8_REACH, mode=Mode.PRIVATE) & part.part
    add(cut_extrude8_tool1.solids().sort_by_distance((-35, 28.510942, 59.75))[0], mode=Mode.SUBTRACT)
    add(cut_extrude8_tool2.solids().sort_by_distance((-35, 28.510942, 39.75))[0], mode=Mode.SUBTRACT)
    add(cut_extrude8_tool3.solids().sort_by_distance((-35, -7.70326, 15))[0], mode=Mode.SUBTRACT)
    add(cut_extrude8_tool4.solids().sort_by_distance((-35, -7.597028, 37.5))[0], mode=Mode.SUBTRACT)
    add(cut_extrude8_tool5.solids().sort_by_distance((-35, -7.612366, 60))[0], mode=Mode.SUBTRACT)
    add(cut_extrude8_tool6.solids().sort_by_distance((-35, -42.387634, 60))[0], mode=Mode.SUBTRACT)
    add(cut_extrude8_tool7.solids().sort_by_distance((-35, -42.372295, 37.5))[0], mode=Mode.SUBTRACT)
    add(cut_extrude8_tool8.solids().sort_by_distance((-35, -42.387634, 15))[0], mode=Mode.SUBTRACT)

    # Sketch65 → Cut-Extrude9 (cut)
    with BuildSketch(Plane.XY.offset(5)):
        with Locations((17.6, 12.1)):
            Circle(SKETCH65_R)
        with Locations((-15.5, 17.9)):
            Circle(SKETCH65_R)
    extrude(amount=-CUT_EXTRUDE9_DEPTH, mode=Mode.SUBTRACT)


solid = part.part
